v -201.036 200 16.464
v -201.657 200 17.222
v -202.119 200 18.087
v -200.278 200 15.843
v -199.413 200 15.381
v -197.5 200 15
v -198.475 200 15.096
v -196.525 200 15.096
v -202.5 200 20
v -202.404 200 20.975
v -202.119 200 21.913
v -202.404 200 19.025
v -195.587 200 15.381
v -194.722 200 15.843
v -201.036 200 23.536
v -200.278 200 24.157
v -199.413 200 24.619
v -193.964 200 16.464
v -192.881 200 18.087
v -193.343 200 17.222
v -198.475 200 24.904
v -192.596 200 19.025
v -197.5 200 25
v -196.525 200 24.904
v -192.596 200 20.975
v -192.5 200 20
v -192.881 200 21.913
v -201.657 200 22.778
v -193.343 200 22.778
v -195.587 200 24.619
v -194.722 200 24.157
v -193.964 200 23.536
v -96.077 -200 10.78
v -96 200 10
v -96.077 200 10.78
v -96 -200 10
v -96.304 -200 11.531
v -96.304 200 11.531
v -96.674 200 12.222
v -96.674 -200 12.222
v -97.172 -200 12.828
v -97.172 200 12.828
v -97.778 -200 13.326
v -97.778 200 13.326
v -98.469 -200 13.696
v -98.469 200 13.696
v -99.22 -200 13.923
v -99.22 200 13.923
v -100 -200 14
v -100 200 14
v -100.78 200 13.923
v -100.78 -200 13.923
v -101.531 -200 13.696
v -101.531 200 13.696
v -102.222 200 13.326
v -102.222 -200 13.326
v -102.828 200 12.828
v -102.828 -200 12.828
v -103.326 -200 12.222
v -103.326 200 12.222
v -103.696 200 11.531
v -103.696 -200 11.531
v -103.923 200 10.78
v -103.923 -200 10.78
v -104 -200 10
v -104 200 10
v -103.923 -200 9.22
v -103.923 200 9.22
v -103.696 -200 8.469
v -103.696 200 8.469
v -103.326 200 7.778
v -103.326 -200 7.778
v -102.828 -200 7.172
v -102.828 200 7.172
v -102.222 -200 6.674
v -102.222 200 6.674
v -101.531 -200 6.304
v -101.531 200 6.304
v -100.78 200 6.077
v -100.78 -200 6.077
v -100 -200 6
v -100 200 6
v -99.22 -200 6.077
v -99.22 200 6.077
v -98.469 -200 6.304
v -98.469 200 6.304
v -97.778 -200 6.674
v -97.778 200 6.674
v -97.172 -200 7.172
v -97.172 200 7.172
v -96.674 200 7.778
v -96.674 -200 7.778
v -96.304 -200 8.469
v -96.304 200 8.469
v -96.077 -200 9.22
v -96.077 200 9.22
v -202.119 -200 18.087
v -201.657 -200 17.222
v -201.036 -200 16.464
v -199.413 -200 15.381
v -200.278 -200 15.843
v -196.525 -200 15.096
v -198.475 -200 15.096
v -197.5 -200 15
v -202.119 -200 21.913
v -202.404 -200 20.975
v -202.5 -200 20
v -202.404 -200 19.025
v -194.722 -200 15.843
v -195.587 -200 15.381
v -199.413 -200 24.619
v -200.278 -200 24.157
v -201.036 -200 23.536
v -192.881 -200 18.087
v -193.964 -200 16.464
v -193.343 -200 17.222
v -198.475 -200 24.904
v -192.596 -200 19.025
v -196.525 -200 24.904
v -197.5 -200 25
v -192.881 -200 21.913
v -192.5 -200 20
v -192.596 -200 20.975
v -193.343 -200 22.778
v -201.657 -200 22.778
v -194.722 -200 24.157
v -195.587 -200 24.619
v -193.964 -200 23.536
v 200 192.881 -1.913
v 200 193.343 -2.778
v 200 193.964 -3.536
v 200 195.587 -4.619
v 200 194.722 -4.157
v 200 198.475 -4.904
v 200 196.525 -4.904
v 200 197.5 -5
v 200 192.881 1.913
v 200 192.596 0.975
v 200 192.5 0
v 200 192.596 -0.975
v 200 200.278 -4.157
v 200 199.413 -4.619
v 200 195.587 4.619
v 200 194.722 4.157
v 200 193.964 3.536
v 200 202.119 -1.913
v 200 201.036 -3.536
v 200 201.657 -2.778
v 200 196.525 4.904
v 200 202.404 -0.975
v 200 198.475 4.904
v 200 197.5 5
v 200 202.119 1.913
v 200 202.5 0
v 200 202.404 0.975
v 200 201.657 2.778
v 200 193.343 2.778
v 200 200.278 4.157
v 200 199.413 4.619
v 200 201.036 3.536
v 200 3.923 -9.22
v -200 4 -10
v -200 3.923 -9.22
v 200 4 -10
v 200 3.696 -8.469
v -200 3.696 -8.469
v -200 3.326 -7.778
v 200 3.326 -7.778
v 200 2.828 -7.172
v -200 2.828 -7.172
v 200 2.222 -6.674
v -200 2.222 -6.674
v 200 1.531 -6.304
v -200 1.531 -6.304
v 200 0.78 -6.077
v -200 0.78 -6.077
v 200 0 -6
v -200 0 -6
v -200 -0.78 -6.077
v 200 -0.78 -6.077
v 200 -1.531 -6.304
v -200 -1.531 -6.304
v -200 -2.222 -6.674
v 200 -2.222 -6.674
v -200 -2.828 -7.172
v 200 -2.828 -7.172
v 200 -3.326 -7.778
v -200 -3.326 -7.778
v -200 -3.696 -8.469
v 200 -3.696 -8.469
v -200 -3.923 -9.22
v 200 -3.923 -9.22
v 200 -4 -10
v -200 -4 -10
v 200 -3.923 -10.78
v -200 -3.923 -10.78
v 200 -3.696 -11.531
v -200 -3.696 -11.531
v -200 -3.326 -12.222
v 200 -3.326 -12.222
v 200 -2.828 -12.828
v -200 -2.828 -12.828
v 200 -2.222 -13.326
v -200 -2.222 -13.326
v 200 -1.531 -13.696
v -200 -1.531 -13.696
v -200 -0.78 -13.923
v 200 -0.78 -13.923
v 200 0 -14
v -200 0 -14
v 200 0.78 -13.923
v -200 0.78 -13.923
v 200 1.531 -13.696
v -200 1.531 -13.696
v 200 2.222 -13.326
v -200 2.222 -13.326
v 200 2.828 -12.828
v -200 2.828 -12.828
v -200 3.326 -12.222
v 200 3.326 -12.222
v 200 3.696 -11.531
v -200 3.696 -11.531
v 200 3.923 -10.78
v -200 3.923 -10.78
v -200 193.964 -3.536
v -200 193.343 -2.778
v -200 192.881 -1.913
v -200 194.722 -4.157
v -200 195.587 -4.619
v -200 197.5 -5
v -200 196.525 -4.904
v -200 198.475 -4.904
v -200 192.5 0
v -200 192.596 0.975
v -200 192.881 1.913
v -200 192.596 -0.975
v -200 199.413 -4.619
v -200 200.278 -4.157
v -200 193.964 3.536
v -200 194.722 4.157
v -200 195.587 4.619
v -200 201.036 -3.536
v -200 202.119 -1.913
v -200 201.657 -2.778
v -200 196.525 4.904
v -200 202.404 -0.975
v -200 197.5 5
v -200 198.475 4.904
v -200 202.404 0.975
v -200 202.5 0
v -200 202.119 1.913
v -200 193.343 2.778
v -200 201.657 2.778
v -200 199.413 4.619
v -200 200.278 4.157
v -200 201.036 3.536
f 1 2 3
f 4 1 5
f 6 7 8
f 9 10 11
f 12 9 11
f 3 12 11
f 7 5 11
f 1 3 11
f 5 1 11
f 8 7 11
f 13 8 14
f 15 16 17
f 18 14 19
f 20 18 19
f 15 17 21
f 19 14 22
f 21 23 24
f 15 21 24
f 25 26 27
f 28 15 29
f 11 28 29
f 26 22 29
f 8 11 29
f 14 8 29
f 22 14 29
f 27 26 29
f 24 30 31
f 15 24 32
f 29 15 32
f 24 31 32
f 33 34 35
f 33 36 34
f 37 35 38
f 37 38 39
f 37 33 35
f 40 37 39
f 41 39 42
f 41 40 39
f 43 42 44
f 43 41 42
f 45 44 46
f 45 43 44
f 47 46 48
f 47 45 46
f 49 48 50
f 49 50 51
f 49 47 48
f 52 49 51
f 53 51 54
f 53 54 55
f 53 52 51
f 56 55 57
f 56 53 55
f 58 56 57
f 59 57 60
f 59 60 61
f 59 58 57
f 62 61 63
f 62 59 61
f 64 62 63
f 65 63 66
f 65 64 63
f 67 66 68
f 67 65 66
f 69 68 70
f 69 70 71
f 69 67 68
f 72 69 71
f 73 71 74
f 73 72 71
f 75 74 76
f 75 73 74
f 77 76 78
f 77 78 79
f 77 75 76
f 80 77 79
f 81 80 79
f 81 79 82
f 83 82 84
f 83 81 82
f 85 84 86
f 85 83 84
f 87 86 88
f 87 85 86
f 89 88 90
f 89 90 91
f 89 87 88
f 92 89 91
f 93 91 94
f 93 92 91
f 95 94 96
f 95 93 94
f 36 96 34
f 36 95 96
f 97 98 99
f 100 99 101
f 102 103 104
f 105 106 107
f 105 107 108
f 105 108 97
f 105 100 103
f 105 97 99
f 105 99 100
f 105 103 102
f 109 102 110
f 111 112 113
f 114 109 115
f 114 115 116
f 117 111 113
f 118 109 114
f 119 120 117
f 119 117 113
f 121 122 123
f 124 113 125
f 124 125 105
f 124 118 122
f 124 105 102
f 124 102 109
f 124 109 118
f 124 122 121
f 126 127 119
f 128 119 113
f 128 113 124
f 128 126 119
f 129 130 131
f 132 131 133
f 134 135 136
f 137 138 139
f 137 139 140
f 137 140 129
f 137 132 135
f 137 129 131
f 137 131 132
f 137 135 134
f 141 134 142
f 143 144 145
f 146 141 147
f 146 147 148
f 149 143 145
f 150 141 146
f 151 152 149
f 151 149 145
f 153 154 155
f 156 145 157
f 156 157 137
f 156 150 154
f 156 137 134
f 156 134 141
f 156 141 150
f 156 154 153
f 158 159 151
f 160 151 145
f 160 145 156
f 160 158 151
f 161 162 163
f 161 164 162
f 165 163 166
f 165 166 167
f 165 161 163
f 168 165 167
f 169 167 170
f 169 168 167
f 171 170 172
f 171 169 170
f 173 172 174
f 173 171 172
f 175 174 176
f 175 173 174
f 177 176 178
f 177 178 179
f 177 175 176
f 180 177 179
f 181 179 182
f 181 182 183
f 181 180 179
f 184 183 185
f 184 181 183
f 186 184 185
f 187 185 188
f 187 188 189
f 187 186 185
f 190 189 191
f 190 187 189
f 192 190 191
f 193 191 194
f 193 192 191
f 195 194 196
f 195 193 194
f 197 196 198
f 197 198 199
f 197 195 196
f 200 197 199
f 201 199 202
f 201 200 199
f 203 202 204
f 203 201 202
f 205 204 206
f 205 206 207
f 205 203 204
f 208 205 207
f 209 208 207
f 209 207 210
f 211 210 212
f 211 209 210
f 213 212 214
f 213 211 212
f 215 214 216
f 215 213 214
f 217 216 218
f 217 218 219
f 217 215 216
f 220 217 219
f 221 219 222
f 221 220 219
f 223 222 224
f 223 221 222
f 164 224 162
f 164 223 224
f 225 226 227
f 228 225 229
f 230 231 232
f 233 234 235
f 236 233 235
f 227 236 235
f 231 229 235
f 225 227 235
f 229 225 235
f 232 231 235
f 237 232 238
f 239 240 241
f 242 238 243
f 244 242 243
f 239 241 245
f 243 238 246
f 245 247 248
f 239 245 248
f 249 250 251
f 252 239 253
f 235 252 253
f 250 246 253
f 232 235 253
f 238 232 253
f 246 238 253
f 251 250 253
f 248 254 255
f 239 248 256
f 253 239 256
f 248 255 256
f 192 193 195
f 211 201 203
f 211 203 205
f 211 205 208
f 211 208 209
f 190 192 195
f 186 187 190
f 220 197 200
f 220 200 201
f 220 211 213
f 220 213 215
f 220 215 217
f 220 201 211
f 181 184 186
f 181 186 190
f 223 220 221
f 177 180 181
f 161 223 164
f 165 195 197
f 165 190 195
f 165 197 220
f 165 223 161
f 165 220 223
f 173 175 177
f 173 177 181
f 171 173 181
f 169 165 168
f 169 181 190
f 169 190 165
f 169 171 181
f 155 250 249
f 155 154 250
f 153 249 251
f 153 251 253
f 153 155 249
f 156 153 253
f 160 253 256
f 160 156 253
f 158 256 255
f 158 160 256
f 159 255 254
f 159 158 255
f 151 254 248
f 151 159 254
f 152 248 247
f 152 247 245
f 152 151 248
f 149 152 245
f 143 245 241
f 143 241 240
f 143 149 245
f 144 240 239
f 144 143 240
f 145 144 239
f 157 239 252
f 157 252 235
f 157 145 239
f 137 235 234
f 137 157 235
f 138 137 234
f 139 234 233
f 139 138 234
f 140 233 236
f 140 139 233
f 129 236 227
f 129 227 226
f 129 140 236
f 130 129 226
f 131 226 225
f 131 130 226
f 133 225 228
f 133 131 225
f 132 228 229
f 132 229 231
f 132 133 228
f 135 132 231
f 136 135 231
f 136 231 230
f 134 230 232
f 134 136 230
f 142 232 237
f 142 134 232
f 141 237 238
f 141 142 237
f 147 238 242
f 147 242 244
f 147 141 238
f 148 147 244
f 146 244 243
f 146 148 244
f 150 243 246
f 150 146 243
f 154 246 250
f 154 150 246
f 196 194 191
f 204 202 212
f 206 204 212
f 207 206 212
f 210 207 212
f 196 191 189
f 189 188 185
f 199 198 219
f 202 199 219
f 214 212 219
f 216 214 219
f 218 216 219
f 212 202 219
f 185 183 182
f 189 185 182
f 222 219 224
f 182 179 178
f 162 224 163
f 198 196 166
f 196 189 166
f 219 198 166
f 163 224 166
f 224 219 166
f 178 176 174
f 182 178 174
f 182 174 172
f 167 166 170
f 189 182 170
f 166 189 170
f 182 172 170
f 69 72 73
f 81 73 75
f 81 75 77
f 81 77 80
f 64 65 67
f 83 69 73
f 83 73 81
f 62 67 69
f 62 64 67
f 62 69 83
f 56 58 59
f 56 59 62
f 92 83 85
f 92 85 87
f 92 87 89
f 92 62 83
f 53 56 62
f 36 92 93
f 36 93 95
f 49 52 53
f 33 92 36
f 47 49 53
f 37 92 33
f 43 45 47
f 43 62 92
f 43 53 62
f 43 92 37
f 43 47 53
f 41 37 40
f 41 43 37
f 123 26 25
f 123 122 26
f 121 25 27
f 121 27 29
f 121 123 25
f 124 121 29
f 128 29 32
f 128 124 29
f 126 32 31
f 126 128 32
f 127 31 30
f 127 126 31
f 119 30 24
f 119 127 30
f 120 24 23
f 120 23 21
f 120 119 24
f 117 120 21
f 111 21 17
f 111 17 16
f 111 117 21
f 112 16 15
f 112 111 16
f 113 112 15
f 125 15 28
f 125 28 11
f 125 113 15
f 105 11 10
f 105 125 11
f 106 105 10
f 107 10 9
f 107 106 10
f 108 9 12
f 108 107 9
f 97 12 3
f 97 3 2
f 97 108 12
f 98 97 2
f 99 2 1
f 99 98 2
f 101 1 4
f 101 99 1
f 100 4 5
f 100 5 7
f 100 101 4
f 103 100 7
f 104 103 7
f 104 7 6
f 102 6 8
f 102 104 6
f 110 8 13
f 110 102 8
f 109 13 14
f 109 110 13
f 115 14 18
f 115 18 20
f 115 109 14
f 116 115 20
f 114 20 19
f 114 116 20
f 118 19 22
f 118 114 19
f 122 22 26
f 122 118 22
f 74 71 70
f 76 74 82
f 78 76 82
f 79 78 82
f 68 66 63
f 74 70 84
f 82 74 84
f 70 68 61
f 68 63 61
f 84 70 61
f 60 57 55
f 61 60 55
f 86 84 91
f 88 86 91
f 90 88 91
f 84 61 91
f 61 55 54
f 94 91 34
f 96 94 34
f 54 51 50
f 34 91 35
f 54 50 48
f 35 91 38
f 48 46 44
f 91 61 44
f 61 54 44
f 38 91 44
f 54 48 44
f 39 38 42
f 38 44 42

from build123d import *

# Parameters (mm, degrees)
F0_R     = 5
F1_DEPTH = 200
F2_R     = 5
F3_DEPTH = 200
F4_R     = 4
F5_DEPTH = 200
F6_R     = 4
F7_DEPTH = 200


with BuildPart() as f1:
    # F0 (on Front) → F1 (new body, symmetric)
    with BuildSketch(Plane.XZ):
        with Locations((-197.5, 20)):
            Circle(F0_R)
    extrude(amount=F1_DEPTH, both=True)


with BuildPart() as f1b:
    # F0 (on Front) → F1, piece 2 (new body, symmetric)
    with BuildSketch(Plane.XZ):
        with Locations((-197.5, -20)):
            Circle(F0_R)
    extrude(amount=F1_DEPTH, both=True)


with BuildPart() as f1c:
    # F0 (on Front) → F1, piece 3 (new body, symmetric)
    with BuildSketch(Plane.XZ):
        with Locations((197.5, -20)):
            Circle(F0_R)
    extrude(amount=F1_DEPTH, both=True)


with BuildPart() as f1d:
    # F0 (on Front) → F1, piece 4 (new body, symmetric)
    with BuildSketch(Plane.XZ):
        with Locations((197.5, 20)):
            Circle(F0_R)
    extrude(amount=F1_DEPTH, both=True)


with BuildPart() as f3:
    # F2 (on Right) → F3 (new body, symmetric)
    with BuildSketch(Plane.YZ):
        with Locations((-197.5, 0)):
            Circle(F2_R)
    extrude(amount=F3_DEPTH, both=True)


with BuildPart() as f3b:
    # F2 (on Right) → F3, piece 2 (new body, symmetric)
    with BuildSketch(Plane.YZ):
        with Locations((197.5, 0)):
            Circle(F2_R)
    extrude(amount=F3_DEPTH, both=True)


with BuildPart() as f5:
    # F4 (on Front) → F5 (new body, symmetric)
    with BuildSketch(Plane.XZ):
        with Locations((-100, 10)):
            Circle(F4_R)
    extrude(amount=F5_DEPTH, both=True)


with BuildPart() as f5b:
    # F4 (on Front) → F5, piece 2 (new body, symmetric)
    with BuildSketch(Plane.XZ):
        with Locations((100, 10)):
            Circle(F4_R)
    extrude(amount=F5_DEPTH, both=True)


with BuildPart() as f7:
    # F6 (on Right) → F7 (new body, symmetric)
    with BuildSketch(Plane.YZ):
        with Locations((0, -10)):
            Circle(F6_R)
    extrude(amount=F7_DEPTH, both=True)


solid = Compound([f1.part, f3b.part, f5.part, f7.part])
